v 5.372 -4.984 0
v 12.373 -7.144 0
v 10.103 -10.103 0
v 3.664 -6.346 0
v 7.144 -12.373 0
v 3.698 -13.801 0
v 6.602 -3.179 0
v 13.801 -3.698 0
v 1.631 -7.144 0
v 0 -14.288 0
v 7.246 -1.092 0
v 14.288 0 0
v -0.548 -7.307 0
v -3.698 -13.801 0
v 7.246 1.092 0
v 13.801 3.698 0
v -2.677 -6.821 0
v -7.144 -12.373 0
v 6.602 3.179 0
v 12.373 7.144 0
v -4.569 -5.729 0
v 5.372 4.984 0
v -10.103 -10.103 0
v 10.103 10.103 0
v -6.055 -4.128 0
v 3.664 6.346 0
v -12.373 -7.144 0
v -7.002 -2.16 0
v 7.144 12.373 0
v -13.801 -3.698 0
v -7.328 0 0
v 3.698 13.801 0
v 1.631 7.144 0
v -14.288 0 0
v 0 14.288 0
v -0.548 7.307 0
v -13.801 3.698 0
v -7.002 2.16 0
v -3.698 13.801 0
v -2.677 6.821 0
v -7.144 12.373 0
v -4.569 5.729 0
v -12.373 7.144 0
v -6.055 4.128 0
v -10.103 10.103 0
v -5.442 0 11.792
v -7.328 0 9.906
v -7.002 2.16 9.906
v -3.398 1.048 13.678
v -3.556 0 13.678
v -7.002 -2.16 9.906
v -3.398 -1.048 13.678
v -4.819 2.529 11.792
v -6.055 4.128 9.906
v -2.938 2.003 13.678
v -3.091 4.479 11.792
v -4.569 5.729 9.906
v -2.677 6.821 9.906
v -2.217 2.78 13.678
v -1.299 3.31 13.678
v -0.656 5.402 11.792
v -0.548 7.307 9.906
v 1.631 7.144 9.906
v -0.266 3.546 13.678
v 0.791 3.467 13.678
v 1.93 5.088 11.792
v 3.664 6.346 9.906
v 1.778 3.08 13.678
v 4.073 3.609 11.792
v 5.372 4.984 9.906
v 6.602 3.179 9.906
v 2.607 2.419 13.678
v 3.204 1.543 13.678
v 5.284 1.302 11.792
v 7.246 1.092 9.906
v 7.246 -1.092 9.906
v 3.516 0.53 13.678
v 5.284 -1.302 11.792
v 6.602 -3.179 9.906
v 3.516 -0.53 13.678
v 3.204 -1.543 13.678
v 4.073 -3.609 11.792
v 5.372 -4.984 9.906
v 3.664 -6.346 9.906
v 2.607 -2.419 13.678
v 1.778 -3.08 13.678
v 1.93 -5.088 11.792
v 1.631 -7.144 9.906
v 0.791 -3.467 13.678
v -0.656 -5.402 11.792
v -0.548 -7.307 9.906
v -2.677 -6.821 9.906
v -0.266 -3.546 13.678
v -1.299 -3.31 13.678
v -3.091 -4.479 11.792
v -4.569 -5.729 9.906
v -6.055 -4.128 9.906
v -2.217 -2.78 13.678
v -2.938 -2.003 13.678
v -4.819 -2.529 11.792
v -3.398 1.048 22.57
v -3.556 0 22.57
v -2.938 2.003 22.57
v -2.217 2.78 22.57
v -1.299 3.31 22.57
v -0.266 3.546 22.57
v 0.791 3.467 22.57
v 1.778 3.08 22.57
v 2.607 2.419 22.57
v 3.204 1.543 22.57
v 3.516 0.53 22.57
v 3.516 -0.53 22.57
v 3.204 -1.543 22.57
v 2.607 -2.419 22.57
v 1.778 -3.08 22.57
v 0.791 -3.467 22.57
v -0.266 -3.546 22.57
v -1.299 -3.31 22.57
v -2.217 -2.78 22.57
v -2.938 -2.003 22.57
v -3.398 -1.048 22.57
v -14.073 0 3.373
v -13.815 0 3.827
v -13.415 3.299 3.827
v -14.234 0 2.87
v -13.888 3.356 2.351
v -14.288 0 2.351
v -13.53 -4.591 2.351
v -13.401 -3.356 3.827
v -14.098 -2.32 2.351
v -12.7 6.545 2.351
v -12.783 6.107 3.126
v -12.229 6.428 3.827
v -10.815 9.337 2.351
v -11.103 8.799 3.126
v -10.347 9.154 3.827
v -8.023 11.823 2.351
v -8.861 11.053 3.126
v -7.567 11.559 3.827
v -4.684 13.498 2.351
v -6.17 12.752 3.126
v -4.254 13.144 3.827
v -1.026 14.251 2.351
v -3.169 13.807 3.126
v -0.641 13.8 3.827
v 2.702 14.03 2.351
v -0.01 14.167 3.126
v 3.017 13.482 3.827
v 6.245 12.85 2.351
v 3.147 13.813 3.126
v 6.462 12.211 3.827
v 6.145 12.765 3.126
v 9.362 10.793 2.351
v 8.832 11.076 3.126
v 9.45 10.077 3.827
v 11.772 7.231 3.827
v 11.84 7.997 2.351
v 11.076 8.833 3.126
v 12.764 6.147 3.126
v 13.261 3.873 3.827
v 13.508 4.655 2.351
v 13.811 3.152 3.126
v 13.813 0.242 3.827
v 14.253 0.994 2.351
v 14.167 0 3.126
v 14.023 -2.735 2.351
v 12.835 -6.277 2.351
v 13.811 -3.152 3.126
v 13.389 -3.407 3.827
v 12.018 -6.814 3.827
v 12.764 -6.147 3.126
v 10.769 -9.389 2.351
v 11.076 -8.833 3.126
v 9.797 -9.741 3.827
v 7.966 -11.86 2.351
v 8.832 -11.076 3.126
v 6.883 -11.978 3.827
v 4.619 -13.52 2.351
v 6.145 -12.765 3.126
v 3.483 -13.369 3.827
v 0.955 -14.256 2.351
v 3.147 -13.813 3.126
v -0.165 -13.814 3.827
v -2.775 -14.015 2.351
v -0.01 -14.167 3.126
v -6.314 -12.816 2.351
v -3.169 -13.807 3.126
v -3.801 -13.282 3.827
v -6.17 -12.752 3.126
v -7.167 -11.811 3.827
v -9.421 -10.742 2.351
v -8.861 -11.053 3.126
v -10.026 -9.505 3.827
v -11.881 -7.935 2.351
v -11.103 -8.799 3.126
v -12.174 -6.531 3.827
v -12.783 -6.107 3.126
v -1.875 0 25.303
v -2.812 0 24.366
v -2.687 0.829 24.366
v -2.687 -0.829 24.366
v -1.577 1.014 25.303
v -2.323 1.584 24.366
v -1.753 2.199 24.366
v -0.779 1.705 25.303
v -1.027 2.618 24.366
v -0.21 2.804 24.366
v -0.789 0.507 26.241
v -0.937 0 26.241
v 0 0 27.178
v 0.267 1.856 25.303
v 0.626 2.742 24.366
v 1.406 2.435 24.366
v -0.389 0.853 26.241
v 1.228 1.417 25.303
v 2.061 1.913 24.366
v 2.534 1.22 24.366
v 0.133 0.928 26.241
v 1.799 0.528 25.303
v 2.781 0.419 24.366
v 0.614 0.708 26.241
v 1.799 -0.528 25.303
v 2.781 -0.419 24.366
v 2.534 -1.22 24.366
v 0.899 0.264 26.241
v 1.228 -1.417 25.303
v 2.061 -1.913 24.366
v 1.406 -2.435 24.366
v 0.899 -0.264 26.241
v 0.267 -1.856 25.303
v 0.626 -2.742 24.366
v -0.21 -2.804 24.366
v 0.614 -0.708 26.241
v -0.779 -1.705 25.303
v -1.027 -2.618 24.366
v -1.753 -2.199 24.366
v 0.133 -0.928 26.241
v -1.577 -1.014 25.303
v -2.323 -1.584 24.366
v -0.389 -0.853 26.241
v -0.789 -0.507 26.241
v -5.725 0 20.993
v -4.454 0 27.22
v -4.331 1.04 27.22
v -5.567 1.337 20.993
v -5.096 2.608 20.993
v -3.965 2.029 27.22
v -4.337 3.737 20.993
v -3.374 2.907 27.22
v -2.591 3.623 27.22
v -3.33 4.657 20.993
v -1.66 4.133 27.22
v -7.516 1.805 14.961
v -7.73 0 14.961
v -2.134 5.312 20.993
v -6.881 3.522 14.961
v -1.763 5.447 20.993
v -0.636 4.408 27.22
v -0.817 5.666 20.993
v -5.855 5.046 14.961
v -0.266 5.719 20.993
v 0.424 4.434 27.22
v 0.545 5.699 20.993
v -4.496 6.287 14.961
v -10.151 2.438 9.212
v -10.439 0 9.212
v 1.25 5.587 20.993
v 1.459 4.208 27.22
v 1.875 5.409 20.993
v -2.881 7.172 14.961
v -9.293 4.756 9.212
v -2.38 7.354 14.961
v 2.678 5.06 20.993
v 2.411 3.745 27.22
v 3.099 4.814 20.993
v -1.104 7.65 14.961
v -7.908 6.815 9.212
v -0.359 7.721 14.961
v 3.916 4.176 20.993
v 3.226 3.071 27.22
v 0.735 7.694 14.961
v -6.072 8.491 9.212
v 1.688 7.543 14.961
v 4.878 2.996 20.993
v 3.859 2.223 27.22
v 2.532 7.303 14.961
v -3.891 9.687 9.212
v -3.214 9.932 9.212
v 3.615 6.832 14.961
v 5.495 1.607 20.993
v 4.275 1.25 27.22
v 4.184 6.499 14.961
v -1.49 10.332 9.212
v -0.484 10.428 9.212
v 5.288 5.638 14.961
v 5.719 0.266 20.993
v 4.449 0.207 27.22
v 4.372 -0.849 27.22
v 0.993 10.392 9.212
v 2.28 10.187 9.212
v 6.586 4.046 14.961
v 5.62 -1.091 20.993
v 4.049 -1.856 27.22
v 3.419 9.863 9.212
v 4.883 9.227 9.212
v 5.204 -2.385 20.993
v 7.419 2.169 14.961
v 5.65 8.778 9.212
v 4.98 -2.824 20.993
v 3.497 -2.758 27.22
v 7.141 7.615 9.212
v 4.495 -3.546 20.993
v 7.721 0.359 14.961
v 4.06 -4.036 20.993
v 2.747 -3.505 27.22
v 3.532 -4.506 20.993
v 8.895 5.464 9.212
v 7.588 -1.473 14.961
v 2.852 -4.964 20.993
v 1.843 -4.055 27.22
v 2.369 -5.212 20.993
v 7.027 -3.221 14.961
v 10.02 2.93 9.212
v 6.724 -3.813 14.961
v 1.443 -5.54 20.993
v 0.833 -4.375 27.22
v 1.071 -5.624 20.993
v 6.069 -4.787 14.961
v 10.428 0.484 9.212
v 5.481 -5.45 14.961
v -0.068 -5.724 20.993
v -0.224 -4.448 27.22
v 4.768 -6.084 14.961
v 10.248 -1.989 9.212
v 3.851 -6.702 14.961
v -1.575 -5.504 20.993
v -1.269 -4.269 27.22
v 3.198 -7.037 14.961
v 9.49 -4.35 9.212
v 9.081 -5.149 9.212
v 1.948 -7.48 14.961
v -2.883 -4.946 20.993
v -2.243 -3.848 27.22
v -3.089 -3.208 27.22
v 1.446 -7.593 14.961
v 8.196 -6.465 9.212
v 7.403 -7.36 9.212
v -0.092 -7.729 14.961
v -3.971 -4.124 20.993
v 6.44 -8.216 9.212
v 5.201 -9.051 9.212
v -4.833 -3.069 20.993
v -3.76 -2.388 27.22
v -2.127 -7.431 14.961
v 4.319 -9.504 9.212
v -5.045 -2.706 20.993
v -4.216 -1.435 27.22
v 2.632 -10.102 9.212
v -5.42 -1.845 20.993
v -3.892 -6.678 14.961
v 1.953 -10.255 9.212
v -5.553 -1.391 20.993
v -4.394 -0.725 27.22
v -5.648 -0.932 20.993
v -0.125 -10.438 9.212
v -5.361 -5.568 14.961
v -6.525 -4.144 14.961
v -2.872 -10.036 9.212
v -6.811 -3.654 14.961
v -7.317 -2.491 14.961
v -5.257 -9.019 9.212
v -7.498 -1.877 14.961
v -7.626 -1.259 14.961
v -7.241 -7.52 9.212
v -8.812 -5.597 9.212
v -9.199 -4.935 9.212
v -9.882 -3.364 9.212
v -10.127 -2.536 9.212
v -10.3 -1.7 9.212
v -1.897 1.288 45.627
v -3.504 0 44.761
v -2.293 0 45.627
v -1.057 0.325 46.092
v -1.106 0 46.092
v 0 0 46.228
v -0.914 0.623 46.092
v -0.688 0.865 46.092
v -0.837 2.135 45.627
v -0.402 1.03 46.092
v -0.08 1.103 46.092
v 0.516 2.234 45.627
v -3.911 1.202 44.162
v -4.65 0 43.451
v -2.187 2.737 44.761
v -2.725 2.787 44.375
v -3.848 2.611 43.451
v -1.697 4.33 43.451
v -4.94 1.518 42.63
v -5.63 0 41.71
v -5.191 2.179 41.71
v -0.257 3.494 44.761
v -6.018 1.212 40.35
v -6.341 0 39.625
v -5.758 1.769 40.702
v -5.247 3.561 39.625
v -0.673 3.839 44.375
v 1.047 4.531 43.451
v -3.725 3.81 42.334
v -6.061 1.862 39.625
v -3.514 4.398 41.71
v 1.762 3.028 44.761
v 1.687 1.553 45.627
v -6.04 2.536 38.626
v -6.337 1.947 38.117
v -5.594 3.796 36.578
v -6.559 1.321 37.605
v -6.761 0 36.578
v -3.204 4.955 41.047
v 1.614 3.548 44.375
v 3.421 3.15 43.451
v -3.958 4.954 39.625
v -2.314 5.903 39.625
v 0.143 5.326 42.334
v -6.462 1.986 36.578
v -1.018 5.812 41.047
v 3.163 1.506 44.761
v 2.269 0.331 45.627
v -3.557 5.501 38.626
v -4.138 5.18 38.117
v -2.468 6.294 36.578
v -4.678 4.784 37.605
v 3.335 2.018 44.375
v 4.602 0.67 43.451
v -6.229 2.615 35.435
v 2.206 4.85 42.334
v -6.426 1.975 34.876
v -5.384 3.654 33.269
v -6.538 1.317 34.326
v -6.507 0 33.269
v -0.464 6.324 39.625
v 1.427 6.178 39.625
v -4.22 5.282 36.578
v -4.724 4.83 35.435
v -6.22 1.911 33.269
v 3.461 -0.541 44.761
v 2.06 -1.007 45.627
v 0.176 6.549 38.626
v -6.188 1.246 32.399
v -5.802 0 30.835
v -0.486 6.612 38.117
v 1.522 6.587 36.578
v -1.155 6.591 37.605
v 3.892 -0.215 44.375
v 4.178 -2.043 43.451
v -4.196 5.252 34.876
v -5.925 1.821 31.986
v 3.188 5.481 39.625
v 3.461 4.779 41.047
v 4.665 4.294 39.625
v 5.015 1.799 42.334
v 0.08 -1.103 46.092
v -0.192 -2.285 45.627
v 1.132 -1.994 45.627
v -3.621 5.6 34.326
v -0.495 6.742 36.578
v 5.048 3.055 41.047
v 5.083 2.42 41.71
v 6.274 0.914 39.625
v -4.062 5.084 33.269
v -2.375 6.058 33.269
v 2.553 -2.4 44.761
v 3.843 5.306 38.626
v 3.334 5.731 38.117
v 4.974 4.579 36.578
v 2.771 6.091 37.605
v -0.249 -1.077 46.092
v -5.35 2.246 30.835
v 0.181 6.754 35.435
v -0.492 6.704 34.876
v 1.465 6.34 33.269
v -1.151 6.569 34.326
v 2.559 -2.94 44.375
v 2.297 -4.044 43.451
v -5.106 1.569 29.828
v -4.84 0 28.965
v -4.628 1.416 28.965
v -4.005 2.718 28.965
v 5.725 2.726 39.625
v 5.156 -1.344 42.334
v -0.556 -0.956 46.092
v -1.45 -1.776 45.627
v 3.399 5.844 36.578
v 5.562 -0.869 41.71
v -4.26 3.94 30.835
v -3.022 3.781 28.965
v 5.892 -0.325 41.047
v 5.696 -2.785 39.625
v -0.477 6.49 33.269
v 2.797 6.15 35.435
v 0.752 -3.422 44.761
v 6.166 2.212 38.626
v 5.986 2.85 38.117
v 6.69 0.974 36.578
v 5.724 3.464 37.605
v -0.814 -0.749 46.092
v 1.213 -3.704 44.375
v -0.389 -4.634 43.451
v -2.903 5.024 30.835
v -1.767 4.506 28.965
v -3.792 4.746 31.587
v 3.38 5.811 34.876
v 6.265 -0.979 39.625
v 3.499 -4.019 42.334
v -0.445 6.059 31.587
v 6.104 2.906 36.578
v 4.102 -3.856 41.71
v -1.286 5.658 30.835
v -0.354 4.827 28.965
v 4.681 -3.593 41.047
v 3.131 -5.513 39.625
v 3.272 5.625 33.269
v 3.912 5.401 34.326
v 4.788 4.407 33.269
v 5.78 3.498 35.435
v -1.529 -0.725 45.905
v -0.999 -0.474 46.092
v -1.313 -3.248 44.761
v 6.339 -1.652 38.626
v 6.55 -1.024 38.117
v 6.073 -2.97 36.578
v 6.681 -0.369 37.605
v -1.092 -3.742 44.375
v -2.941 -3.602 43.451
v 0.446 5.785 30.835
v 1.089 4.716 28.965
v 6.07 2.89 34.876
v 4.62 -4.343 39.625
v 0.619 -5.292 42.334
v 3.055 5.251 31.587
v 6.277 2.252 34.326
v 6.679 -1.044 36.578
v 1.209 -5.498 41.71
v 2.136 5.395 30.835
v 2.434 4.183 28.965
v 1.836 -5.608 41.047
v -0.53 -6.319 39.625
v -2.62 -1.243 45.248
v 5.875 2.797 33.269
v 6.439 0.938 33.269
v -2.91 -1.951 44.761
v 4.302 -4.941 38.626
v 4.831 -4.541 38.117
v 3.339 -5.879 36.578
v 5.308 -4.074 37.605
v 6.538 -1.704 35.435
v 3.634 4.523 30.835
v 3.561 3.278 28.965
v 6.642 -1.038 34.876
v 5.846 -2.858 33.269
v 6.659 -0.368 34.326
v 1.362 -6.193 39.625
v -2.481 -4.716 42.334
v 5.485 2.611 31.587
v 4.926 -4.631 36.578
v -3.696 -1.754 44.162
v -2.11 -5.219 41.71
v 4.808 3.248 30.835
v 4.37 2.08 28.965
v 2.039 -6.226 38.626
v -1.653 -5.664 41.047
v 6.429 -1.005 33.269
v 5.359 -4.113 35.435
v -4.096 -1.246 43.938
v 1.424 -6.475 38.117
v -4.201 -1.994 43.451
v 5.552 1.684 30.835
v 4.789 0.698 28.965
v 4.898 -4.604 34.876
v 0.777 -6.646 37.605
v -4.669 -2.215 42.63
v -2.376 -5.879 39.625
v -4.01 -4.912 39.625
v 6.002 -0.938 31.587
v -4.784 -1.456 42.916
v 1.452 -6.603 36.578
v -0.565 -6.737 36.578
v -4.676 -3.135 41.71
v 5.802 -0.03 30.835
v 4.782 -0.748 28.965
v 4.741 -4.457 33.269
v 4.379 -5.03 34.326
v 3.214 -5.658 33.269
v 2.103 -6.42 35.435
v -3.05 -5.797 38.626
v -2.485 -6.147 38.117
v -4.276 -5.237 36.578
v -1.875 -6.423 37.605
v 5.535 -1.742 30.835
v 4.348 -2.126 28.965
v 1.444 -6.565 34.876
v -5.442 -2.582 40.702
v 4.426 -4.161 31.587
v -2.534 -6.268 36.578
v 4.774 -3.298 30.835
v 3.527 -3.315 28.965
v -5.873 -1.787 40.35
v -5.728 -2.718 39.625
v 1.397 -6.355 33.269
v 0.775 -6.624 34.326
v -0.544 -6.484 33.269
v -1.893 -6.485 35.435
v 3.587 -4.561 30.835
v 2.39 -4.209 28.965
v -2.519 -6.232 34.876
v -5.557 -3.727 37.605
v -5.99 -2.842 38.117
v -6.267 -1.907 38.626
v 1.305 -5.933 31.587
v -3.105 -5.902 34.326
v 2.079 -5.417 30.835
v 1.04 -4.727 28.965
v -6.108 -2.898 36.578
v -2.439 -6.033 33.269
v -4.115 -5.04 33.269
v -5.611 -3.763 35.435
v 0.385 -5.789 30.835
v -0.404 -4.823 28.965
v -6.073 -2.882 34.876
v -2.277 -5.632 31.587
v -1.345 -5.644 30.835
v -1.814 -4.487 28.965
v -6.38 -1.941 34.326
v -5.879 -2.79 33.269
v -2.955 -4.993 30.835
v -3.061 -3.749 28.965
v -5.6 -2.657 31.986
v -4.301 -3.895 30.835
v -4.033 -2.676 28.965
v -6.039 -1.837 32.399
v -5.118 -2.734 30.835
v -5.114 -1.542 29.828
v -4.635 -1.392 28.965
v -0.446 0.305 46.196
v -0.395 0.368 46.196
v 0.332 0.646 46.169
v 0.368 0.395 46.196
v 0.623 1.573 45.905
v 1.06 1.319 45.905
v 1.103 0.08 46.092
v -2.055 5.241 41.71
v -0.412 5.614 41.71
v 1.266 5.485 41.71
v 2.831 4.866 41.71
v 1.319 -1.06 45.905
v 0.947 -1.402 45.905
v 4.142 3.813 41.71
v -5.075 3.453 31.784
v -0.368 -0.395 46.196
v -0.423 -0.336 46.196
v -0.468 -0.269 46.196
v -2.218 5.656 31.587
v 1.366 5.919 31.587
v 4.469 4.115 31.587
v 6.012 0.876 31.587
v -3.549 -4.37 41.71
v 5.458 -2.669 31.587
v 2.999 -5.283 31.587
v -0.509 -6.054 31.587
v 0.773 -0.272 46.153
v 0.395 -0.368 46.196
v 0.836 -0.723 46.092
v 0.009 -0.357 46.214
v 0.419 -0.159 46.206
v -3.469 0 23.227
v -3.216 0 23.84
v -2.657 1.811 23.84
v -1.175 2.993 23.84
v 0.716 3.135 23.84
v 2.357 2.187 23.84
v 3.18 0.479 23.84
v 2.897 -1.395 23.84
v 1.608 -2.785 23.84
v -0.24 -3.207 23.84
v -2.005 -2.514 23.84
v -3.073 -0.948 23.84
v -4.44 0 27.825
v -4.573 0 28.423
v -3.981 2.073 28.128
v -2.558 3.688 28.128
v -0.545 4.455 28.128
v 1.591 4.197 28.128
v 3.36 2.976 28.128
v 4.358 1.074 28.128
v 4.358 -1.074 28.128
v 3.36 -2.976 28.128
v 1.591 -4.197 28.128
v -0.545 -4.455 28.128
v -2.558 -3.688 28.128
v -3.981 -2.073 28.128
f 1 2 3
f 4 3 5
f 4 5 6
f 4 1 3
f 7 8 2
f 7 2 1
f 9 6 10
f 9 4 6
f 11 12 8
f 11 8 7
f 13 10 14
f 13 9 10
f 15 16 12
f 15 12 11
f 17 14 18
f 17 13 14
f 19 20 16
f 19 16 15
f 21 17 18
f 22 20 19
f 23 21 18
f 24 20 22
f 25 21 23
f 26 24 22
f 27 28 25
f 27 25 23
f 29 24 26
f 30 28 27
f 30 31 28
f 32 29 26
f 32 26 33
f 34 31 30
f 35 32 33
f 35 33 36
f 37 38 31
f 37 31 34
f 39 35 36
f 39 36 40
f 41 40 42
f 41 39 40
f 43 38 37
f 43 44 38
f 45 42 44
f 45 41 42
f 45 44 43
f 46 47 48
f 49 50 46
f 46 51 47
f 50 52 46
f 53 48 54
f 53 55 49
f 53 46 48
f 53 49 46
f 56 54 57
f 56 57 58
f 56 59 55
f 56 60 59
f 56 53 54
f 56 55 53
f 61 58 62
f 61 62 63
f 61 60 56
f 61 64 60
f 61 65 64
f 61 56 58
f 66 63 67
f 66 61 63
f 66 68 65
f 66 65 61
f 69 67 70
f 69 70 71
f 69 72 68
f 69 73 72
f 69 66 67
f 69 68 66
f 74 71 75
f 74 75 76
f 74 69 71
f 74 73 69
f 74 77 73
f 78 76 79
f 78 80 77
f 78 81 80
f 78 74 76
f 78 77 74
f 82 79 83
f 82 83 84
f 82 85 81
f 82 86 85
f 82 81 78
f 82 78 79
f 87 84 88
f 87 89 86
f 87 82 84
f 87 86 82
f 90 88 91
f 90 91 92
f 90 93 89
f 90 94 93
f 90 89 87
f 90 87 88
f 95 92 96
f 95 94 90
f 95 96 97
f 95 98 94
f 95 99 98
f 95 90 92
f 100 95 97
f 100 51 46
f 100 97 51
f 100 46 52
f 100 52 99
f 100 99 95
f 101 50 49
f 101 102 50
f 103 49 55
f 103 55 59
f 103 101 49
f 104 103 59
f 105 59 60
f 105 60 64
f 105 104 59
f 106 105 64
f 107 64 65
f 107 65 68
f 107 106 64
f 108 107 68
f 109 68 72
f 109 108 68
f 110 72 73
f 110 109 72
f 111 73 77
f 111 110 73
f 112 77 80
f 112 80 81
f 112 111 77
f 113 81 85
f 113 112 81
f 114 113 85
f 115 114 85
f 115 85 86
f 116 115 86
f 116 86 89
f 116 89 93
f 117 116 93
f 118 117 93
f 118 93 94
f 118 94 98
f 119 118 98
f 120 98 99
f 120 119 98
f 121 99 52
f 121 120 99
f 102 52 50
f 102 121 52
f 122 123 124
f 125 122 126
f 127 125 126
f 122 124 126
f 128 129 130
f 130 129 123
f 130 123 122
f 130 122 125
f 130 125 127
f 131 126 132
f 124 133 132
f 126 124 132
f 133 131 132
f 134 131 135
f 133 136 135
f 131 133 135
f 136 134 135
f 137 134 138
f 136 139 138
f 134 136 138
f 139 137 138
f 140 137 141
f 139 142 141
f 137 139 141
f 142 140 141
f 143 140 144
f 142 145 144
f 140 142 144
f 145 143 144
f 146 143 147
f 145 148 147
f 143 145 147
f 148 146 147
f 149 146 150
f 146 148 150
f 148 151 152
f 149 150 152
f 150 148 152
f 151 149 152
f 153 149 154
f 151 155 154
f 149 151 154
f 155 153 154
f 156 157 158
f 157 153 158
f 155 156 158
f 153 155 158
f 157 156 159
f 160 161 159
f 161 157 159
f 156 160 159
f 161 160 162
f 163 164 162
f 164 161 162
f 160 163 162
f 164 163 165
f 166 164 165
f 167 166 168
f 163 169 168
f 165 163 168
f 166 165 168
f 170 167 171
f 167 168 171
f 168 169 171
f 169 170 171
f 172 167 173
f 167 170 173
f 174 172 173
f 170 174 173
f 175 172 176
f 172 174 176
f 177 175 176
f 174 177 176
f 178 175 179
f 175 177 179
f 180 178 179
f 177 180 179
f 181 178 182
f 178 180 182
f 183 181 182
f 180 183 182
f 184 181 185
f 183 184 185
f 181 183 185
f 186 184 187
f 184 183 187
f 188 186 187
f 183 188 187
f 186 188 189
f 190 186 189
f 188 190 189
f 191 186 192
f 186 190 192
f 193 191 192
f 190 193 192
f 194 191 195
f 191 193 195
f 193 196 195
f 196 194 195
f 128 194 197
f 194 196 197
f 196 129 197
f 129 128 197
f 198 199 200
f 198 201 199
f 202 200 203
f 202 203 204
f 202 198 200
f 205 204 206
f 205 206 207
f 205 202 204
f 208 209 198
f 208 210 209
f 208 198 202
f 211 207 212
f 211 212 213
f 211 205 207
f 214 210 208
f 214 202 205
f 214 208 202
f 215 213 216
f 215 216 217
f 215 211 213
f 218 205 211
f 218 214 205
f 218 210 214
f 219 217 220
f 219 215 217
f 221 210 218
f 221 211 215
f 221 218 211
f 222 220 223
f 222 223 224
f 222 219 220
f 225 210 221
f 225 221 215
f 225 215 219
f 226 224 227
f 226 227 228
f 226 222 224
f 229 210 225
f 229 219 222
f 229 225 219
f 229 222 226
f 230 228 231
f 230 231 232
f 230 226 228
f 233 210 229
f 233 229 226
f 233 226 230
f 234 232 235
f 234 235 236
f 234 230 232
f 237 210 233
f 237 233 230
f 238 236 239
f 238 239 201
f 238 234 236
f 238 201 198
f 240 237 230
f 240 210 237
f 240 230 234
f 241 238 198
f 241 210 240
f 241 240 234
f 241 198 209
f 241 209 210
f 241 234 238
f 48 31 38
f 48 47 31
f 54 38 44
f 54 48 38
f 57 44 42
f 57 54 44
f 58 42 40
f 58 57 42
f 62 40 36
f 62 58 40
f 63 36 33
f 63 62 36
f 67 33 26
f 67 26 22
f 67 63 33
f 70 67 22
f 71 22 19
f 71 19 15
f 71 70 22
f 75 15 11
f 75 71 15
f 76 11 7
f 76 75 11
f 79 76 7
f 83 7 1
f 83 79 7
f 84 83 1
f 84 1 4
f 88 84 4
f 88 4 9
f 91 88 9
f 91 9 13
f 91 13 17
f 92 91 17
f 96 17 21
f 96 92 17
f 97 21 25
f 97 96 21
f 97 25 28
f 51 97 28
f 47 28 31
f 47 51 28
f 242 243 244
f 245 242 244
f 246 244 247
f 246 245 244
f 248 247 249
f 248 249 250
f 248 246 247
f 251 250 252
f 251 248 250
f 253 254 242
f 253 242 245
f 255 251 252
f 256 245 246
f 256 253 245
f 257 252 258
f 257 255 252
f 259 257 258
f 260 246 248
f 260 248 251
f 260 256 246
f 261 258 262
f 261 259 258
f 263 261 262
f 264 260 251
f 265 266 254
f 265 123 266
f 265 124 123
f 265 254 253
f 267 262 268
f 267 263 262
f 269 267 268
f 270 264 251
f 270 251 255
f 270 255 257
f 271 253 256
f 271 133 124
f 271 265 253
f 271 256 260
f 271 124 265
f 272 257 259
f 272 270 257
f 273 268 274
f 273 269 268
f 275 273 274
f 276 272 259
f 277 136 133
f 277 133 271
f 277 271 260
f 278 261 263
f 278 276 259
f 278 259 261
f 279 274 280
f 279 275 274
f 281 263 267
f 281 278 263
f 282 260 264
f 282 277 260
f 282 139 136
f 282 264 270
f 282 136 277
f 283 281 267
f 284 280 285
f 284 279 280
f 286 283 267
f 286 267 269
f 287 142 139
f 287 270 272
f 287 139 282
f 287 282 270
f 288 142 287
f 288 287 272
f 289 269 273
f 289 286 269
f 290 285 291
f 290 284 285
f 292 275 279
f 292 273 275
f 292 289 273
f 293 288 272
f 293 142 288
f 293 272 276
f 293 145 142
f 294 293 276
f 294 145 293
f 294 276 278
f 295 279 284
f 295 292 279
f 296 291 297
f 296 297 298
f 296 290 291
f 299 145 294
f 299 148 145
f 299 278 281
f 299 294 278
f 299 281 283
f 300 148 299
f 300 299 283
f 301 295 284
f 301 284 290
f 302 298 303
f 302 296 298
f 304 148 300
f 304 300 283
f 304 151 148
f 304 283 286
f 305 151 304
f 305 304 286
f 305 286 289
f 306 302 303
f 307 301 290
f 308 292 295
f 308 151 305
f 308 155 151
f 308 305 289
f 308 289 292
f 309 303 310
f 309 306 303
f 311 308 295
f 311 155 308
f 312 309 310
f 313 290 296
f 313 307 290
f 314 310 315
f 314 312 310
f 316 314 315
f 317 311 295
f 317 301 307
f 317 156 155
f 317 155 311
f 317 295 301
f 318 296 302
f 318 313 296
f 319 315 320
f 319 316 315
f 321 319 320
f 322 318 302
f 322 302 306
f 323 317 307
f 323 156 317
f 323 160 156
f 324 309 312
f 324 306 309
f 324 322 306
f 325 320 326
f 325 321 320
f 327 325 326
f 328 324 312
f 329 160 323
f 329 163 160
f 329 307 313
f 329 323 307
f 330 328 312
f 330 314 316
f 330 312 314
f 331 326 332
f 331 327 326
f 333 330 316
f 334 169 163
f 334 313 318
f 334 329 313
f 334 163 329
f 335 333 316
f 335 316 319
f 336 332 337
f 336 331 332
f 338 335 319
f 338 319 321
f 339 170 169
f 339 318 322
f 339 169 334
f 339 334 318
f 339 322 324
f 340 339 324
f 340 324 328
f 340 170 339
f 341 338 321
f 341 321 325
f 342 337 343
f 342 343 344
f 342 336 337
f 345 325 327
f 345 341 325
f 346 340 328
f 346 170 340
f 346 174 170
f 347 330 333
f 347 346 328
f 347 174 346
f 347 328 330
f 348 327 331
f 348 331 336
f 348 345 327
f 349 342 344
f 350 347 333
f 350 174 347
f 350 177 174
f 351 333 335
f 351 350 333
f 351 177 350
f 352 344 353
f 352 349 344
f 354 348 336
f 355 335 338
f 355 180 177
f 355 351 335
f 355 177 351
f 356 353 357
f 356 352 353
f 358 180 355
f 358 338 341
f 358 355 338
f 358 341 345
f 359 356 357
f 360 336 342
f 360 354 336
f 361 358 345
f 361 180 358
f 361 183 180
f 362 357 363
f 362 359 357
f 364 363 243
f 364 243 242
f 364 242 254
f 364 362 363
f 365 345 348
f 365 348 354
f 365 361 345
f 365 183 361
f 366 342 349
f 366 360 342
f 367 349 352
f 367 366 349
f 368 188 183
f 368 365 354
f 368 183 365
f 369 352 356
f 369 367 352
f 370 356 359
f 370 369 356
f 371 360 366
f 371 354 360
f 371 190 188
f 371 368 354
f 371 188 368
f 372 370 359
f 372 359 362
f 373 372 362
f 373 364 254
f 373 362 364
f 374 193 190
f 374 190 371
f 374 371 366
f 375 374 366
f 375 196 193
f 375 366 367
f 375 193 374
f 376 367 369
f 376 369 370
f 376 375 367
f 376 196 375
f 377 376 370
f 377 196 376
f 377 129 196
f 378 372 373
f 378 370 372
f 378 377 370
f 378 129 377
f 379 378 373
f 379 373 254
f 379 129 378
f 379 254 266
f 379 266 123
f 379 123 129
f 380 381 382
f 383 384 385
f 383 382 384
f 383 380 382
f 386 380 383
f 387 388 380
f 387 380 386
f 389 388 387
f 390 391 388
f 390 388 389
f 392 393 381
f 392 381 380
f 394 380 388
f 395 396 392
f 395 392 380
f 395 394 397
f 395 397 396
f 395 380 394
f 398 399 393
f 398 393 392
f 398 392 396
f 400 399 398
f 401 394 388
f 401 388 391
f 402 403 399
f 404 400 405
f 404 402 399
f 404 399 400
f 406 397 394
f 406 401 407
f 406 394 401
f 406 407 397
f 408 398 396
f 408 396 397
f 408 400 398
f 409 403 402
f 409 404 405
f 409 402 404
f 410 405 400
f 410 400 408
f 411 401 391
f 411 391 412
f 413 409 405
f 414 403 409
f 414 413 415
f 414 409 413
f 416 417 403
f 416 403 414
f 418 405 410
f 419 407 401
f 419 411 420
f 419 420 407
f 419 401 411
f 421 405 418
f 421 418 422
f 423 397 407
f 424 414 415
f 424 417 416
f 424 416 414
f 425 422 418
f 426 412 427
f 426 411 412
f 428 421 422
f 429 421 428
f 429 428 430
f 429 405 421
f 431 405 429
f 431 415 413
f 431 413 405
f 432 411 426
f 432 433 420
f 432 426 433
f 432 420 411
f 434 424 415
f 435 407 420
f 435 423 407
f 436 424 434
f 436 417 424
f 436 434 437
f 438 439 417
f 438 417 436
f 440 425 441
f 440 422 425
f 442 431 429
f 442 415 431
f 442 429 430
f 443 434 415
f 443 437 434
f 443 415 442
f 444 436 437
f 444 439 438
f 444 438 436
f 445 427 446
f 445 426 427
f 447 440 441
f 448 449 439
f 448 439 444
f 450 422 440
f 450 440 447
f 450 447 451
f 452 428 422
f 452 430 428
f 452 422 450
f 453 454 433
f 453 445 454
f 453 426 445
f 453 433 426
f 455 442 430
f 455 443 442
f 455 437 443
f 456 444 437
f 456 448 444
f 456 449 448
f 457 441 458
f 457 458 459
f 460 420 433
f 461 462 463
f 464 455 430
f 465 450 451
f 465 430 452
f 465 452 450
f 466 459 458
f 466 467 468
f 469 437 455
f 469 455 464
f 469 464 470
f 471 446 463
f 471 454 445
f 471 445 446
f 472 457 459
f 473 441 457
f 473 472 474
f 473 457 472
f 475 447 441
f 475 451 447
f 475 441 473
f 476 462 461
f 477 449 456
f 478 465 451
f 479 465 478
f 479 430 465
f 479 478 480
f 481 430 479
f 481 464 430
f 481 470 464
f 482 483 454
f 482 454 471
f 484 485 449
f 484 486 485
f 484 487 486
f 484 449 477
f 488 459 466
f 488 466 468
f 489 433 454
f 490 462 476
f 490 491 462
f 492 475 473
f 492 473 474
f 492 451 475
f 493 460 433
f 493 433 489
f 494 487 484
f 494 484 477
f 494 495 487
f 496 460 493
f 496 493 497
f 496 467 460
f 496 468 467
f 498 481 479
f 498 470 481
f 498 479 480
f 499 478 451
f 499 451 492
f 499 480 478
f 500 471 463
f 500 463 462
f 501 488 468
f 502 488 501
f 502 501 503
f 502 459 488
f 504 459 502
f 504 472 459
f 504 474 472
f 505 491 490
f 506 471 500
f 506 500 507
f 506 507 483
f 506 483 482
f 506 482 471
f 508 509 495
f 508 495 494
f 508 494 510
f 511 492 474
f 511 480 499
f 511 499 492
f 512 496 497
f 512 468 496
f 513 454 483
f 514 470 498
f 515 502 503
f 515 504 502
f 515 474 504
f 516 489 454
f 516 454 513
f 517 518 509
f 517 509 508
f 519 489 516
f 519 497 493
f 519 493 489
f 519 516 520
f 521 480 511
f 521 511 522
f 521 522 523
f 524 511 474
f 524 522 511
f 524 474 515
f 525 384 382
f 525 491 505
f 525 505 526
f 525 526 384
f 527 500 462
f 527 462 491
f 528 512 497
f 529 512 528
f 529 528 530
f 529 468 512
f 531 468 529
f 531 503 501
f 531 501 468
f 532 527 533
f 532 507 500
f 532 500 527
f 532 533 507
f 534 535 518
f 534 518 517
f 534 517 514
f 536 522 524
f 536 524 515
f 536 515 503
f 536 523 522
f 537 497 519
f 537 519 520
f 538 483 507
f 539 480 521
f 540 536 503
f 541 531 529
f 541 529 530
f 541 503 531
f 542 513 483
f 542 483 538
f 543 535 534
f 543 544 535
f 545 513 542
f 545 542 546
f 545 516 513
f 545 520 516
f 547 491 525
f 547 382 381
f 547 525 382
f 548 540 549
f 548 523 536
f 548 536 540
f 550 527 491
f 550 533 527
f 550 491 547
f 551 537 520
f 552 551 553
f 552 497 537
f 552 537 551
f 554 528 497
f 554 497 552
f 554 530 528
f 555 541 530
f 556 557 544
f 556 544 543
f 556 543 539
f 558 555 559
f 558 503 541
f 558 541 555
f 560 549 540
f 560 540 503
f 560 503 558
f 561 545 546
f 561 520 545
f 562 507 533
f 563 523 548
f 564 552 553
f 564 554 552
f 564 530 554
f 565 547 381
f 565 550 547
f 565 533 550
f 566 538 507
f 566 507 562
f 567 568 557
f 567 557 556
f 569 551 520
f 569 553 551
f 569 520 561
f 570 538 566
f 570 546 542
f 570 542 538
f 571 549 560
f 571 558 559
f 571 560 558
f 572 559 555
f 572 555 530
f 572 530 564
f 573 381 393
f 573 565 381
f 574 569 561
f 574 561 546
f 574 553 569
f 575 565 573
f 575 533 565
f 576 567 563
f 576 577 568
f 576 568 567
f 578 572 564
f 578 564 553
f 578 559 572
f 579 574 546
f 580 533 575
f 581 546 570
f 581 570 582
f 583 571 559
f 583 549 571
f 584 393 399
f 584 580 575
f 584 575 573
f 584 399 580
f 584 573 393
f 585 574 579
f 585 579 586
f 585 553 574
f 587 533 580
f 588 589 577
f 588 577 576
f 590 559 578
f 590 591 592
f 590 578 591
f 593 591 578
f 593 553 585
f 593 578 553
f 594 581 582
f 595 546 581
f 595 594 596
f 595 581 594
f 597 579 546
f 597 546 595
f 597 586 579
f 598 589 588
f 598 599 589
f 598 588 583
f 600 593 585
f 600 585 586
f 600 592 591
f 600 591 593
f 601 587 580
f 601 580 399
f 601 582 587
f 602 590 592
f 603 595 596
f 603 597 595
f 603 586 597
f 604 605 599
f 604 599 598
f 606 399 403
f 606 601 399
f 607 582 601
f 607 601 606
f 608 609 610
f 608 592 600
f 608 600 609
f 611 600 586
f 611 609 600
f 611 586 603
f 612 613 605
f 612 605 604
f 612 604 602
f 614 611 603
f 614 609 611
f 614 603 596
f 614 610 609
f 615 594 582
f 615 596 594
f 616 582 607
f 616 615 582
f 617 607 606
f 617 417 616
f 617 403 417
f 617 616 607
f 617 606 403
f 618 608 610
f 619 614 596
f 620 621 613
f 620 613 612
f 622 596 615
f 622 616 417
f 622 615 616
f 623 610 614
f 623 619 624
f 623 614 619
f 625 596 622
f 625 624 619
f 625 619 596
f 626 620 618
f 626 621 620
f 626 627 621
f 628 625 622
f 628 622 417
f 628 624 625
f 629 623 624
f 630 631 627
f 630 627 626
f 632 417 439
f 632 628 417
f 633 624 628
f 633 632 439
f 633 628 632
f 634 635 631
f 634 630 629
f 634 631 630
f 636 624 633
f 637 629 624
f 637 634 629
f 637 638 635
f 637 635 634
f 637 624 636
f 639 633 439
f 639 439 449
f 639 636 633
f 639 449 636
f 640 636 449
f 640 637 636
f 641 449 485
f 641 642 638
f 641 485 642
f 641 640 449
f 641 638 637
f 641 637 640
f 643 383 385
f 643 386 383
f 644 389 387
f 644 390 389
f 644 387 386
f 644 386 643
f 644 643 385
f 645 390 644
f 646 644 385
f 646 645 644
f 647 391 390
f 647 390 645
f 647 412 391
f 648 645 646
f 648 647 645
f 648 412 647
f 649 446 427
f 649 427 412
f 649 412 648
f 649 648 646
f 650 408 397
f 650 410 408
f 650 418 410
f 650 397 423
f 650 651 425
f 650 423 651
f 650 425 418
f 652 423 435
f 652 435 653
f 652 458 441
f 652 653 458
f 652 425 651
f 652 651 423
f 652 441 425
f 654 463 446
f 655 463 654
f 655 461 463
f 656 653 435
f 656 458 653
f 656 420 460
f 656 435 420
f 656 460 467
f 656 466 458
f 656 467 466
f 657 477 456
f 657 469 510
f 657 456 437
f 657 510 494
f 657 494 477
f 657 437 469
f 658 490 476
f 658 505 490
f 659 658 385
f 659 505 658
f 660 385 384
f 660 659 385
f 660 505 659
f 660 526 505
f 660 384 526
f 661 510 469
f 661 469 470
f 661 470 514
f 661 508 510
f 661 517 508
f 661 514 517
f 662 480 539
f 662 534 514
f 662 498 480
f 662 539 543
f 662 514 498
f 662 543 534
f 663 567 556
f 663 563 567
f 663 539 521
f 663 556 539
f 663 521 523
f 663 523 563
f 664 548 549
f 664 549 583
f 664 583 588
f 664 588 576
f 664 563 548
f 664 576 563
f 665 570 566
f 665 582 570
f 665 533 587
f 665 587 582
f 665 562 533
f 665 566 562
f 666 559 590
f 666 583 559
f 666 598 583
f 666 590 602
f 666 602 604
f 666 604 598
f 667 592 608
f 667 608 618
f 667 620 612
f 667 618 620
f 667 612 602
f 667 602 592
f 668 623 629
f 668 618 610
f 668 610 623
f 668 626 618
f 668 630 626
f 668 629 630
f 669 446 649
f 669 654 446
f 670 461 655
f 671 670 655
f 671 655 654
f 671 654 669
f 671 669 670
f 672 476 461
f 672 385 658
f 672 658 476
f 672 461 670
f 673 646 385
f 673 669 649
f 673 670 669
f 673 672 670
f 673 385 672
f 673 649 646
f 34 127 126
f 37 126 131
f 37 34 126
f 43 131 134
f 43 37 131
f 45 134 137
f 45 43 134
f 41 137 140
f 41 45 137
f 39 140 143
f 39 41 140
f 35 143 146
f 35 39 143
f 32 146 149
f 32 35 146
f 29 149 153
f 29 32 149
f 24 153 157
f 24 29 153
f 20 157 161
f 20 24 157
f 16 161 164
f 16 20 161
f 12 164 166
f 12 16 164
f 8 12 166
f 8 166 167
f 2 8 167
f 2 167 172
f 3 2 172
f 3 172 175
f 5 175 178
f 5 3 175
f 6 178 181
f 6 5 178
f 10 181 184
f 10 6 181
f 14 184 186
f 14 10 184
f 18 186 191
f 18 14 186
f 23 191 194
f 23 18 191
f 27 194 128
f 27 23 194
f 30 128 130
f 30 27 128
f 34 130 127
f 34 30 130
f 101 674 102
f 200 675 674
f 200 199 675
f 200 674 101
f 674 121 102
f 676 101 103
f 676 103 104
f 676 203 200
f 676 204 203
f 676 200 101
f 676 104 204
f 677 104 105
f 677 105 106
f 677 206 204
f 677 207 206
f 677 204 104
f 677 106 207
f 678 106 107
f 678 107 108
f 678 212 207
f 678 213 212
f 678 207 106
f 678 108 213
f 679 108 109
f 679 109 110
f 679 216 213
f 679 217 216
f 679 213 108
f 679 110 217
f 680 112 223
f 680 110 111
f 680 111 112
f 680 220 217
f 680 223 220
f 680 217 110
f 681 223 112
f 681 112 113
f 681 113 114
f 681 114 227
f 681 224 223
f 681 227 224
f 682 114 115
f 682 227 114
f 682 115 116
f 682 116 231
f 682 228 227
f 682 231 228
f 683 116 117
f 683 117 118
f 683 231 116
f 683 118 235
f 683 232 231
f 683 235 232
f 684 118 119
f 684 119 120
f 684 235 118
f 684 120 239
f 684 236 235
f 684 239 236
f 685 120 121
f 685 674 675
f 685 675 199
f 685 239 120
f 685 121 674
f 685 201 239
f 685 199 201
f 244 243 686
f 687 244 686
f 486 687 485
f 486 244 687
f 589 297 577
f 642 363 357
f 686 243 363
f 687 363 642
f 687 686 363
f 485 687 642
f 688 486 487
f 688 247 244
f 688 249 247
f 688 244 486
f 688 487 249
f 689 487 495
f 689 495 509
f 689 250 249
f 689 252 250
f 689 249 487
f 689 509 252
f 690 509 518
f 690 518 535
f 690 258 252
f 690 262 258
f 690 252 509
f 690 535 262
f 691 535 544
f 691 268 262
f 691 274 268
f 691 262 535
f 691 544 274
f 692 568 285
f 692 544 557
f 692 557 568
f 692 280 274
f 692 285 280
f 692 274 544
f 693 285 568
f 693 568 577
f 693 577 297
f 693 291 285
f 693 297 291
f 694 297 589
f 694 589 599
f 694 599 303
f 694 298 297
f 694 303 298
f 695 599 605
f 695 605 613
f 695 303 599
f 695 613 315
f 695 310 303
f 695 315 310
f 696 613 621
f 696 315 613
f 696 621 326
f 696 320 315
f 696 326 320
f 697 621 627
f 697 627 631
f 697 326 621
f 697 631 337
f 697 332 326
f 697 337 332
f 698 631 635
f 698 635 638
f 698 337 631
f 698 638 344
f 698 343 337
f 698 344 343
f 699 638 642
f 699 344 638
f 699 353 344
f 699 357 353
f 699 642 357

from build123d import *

# Parameters (mm, degrees)
F2_R = 2.54


with BuildPart() as f1:
    # F0 (on Front) → F1 (revolve)
    with BuildSketch(Plane.XZ):
        with BuildLine():
            ThreePointArc((-4.318, 28.2435778242), (-7.6873775939, 15.0668729236), (-14.2875, 3.175))
            Line((-14.2875, 3.175), (-14.2875, 0))
            Line((-14.2875, 0), (-7.3279, 0))
            Line((-7.3279, 0), (-7.3279, 9.906))
            Line((-7.3279, 9.906), (-3.556, 13.6779))
            Line((-3.556, 13.6779), (-3.556, 22.5698975516))
            ThreePointArc((-3.556, 22.5698975516), (-3.3626540126, 23.5419134698), (-2.8120512242, 24.3659487758))
            Line((-2.8120512242, 24.3659487758), (0, 27.178))
            Line((0, 27.178), (0, 46.228))
            add(Edge.make_bspline(
                [(0, 46.228), (-18.7837371747, 46.228), (-4.318, 28.2435778242)],
                knots=[0, 0, 0, 2.4498260338, 2.4498260338, 2.4498260338], degree=2, weights=[1, 0.3390278065, 1]))
        make_face()
    revolve(axis=Axis((0, 0, 36.703), (0, 0, -1)))

    # F2
    f2_edges = [f1.edges().sort_by_distance(p)[0] for p in [
        (4.318, 0, 28.243578),
        (14.2875, 0, 3.175),
    ]]
    fillet(f2_edges, radius=F2_R)


solid = f1.part
